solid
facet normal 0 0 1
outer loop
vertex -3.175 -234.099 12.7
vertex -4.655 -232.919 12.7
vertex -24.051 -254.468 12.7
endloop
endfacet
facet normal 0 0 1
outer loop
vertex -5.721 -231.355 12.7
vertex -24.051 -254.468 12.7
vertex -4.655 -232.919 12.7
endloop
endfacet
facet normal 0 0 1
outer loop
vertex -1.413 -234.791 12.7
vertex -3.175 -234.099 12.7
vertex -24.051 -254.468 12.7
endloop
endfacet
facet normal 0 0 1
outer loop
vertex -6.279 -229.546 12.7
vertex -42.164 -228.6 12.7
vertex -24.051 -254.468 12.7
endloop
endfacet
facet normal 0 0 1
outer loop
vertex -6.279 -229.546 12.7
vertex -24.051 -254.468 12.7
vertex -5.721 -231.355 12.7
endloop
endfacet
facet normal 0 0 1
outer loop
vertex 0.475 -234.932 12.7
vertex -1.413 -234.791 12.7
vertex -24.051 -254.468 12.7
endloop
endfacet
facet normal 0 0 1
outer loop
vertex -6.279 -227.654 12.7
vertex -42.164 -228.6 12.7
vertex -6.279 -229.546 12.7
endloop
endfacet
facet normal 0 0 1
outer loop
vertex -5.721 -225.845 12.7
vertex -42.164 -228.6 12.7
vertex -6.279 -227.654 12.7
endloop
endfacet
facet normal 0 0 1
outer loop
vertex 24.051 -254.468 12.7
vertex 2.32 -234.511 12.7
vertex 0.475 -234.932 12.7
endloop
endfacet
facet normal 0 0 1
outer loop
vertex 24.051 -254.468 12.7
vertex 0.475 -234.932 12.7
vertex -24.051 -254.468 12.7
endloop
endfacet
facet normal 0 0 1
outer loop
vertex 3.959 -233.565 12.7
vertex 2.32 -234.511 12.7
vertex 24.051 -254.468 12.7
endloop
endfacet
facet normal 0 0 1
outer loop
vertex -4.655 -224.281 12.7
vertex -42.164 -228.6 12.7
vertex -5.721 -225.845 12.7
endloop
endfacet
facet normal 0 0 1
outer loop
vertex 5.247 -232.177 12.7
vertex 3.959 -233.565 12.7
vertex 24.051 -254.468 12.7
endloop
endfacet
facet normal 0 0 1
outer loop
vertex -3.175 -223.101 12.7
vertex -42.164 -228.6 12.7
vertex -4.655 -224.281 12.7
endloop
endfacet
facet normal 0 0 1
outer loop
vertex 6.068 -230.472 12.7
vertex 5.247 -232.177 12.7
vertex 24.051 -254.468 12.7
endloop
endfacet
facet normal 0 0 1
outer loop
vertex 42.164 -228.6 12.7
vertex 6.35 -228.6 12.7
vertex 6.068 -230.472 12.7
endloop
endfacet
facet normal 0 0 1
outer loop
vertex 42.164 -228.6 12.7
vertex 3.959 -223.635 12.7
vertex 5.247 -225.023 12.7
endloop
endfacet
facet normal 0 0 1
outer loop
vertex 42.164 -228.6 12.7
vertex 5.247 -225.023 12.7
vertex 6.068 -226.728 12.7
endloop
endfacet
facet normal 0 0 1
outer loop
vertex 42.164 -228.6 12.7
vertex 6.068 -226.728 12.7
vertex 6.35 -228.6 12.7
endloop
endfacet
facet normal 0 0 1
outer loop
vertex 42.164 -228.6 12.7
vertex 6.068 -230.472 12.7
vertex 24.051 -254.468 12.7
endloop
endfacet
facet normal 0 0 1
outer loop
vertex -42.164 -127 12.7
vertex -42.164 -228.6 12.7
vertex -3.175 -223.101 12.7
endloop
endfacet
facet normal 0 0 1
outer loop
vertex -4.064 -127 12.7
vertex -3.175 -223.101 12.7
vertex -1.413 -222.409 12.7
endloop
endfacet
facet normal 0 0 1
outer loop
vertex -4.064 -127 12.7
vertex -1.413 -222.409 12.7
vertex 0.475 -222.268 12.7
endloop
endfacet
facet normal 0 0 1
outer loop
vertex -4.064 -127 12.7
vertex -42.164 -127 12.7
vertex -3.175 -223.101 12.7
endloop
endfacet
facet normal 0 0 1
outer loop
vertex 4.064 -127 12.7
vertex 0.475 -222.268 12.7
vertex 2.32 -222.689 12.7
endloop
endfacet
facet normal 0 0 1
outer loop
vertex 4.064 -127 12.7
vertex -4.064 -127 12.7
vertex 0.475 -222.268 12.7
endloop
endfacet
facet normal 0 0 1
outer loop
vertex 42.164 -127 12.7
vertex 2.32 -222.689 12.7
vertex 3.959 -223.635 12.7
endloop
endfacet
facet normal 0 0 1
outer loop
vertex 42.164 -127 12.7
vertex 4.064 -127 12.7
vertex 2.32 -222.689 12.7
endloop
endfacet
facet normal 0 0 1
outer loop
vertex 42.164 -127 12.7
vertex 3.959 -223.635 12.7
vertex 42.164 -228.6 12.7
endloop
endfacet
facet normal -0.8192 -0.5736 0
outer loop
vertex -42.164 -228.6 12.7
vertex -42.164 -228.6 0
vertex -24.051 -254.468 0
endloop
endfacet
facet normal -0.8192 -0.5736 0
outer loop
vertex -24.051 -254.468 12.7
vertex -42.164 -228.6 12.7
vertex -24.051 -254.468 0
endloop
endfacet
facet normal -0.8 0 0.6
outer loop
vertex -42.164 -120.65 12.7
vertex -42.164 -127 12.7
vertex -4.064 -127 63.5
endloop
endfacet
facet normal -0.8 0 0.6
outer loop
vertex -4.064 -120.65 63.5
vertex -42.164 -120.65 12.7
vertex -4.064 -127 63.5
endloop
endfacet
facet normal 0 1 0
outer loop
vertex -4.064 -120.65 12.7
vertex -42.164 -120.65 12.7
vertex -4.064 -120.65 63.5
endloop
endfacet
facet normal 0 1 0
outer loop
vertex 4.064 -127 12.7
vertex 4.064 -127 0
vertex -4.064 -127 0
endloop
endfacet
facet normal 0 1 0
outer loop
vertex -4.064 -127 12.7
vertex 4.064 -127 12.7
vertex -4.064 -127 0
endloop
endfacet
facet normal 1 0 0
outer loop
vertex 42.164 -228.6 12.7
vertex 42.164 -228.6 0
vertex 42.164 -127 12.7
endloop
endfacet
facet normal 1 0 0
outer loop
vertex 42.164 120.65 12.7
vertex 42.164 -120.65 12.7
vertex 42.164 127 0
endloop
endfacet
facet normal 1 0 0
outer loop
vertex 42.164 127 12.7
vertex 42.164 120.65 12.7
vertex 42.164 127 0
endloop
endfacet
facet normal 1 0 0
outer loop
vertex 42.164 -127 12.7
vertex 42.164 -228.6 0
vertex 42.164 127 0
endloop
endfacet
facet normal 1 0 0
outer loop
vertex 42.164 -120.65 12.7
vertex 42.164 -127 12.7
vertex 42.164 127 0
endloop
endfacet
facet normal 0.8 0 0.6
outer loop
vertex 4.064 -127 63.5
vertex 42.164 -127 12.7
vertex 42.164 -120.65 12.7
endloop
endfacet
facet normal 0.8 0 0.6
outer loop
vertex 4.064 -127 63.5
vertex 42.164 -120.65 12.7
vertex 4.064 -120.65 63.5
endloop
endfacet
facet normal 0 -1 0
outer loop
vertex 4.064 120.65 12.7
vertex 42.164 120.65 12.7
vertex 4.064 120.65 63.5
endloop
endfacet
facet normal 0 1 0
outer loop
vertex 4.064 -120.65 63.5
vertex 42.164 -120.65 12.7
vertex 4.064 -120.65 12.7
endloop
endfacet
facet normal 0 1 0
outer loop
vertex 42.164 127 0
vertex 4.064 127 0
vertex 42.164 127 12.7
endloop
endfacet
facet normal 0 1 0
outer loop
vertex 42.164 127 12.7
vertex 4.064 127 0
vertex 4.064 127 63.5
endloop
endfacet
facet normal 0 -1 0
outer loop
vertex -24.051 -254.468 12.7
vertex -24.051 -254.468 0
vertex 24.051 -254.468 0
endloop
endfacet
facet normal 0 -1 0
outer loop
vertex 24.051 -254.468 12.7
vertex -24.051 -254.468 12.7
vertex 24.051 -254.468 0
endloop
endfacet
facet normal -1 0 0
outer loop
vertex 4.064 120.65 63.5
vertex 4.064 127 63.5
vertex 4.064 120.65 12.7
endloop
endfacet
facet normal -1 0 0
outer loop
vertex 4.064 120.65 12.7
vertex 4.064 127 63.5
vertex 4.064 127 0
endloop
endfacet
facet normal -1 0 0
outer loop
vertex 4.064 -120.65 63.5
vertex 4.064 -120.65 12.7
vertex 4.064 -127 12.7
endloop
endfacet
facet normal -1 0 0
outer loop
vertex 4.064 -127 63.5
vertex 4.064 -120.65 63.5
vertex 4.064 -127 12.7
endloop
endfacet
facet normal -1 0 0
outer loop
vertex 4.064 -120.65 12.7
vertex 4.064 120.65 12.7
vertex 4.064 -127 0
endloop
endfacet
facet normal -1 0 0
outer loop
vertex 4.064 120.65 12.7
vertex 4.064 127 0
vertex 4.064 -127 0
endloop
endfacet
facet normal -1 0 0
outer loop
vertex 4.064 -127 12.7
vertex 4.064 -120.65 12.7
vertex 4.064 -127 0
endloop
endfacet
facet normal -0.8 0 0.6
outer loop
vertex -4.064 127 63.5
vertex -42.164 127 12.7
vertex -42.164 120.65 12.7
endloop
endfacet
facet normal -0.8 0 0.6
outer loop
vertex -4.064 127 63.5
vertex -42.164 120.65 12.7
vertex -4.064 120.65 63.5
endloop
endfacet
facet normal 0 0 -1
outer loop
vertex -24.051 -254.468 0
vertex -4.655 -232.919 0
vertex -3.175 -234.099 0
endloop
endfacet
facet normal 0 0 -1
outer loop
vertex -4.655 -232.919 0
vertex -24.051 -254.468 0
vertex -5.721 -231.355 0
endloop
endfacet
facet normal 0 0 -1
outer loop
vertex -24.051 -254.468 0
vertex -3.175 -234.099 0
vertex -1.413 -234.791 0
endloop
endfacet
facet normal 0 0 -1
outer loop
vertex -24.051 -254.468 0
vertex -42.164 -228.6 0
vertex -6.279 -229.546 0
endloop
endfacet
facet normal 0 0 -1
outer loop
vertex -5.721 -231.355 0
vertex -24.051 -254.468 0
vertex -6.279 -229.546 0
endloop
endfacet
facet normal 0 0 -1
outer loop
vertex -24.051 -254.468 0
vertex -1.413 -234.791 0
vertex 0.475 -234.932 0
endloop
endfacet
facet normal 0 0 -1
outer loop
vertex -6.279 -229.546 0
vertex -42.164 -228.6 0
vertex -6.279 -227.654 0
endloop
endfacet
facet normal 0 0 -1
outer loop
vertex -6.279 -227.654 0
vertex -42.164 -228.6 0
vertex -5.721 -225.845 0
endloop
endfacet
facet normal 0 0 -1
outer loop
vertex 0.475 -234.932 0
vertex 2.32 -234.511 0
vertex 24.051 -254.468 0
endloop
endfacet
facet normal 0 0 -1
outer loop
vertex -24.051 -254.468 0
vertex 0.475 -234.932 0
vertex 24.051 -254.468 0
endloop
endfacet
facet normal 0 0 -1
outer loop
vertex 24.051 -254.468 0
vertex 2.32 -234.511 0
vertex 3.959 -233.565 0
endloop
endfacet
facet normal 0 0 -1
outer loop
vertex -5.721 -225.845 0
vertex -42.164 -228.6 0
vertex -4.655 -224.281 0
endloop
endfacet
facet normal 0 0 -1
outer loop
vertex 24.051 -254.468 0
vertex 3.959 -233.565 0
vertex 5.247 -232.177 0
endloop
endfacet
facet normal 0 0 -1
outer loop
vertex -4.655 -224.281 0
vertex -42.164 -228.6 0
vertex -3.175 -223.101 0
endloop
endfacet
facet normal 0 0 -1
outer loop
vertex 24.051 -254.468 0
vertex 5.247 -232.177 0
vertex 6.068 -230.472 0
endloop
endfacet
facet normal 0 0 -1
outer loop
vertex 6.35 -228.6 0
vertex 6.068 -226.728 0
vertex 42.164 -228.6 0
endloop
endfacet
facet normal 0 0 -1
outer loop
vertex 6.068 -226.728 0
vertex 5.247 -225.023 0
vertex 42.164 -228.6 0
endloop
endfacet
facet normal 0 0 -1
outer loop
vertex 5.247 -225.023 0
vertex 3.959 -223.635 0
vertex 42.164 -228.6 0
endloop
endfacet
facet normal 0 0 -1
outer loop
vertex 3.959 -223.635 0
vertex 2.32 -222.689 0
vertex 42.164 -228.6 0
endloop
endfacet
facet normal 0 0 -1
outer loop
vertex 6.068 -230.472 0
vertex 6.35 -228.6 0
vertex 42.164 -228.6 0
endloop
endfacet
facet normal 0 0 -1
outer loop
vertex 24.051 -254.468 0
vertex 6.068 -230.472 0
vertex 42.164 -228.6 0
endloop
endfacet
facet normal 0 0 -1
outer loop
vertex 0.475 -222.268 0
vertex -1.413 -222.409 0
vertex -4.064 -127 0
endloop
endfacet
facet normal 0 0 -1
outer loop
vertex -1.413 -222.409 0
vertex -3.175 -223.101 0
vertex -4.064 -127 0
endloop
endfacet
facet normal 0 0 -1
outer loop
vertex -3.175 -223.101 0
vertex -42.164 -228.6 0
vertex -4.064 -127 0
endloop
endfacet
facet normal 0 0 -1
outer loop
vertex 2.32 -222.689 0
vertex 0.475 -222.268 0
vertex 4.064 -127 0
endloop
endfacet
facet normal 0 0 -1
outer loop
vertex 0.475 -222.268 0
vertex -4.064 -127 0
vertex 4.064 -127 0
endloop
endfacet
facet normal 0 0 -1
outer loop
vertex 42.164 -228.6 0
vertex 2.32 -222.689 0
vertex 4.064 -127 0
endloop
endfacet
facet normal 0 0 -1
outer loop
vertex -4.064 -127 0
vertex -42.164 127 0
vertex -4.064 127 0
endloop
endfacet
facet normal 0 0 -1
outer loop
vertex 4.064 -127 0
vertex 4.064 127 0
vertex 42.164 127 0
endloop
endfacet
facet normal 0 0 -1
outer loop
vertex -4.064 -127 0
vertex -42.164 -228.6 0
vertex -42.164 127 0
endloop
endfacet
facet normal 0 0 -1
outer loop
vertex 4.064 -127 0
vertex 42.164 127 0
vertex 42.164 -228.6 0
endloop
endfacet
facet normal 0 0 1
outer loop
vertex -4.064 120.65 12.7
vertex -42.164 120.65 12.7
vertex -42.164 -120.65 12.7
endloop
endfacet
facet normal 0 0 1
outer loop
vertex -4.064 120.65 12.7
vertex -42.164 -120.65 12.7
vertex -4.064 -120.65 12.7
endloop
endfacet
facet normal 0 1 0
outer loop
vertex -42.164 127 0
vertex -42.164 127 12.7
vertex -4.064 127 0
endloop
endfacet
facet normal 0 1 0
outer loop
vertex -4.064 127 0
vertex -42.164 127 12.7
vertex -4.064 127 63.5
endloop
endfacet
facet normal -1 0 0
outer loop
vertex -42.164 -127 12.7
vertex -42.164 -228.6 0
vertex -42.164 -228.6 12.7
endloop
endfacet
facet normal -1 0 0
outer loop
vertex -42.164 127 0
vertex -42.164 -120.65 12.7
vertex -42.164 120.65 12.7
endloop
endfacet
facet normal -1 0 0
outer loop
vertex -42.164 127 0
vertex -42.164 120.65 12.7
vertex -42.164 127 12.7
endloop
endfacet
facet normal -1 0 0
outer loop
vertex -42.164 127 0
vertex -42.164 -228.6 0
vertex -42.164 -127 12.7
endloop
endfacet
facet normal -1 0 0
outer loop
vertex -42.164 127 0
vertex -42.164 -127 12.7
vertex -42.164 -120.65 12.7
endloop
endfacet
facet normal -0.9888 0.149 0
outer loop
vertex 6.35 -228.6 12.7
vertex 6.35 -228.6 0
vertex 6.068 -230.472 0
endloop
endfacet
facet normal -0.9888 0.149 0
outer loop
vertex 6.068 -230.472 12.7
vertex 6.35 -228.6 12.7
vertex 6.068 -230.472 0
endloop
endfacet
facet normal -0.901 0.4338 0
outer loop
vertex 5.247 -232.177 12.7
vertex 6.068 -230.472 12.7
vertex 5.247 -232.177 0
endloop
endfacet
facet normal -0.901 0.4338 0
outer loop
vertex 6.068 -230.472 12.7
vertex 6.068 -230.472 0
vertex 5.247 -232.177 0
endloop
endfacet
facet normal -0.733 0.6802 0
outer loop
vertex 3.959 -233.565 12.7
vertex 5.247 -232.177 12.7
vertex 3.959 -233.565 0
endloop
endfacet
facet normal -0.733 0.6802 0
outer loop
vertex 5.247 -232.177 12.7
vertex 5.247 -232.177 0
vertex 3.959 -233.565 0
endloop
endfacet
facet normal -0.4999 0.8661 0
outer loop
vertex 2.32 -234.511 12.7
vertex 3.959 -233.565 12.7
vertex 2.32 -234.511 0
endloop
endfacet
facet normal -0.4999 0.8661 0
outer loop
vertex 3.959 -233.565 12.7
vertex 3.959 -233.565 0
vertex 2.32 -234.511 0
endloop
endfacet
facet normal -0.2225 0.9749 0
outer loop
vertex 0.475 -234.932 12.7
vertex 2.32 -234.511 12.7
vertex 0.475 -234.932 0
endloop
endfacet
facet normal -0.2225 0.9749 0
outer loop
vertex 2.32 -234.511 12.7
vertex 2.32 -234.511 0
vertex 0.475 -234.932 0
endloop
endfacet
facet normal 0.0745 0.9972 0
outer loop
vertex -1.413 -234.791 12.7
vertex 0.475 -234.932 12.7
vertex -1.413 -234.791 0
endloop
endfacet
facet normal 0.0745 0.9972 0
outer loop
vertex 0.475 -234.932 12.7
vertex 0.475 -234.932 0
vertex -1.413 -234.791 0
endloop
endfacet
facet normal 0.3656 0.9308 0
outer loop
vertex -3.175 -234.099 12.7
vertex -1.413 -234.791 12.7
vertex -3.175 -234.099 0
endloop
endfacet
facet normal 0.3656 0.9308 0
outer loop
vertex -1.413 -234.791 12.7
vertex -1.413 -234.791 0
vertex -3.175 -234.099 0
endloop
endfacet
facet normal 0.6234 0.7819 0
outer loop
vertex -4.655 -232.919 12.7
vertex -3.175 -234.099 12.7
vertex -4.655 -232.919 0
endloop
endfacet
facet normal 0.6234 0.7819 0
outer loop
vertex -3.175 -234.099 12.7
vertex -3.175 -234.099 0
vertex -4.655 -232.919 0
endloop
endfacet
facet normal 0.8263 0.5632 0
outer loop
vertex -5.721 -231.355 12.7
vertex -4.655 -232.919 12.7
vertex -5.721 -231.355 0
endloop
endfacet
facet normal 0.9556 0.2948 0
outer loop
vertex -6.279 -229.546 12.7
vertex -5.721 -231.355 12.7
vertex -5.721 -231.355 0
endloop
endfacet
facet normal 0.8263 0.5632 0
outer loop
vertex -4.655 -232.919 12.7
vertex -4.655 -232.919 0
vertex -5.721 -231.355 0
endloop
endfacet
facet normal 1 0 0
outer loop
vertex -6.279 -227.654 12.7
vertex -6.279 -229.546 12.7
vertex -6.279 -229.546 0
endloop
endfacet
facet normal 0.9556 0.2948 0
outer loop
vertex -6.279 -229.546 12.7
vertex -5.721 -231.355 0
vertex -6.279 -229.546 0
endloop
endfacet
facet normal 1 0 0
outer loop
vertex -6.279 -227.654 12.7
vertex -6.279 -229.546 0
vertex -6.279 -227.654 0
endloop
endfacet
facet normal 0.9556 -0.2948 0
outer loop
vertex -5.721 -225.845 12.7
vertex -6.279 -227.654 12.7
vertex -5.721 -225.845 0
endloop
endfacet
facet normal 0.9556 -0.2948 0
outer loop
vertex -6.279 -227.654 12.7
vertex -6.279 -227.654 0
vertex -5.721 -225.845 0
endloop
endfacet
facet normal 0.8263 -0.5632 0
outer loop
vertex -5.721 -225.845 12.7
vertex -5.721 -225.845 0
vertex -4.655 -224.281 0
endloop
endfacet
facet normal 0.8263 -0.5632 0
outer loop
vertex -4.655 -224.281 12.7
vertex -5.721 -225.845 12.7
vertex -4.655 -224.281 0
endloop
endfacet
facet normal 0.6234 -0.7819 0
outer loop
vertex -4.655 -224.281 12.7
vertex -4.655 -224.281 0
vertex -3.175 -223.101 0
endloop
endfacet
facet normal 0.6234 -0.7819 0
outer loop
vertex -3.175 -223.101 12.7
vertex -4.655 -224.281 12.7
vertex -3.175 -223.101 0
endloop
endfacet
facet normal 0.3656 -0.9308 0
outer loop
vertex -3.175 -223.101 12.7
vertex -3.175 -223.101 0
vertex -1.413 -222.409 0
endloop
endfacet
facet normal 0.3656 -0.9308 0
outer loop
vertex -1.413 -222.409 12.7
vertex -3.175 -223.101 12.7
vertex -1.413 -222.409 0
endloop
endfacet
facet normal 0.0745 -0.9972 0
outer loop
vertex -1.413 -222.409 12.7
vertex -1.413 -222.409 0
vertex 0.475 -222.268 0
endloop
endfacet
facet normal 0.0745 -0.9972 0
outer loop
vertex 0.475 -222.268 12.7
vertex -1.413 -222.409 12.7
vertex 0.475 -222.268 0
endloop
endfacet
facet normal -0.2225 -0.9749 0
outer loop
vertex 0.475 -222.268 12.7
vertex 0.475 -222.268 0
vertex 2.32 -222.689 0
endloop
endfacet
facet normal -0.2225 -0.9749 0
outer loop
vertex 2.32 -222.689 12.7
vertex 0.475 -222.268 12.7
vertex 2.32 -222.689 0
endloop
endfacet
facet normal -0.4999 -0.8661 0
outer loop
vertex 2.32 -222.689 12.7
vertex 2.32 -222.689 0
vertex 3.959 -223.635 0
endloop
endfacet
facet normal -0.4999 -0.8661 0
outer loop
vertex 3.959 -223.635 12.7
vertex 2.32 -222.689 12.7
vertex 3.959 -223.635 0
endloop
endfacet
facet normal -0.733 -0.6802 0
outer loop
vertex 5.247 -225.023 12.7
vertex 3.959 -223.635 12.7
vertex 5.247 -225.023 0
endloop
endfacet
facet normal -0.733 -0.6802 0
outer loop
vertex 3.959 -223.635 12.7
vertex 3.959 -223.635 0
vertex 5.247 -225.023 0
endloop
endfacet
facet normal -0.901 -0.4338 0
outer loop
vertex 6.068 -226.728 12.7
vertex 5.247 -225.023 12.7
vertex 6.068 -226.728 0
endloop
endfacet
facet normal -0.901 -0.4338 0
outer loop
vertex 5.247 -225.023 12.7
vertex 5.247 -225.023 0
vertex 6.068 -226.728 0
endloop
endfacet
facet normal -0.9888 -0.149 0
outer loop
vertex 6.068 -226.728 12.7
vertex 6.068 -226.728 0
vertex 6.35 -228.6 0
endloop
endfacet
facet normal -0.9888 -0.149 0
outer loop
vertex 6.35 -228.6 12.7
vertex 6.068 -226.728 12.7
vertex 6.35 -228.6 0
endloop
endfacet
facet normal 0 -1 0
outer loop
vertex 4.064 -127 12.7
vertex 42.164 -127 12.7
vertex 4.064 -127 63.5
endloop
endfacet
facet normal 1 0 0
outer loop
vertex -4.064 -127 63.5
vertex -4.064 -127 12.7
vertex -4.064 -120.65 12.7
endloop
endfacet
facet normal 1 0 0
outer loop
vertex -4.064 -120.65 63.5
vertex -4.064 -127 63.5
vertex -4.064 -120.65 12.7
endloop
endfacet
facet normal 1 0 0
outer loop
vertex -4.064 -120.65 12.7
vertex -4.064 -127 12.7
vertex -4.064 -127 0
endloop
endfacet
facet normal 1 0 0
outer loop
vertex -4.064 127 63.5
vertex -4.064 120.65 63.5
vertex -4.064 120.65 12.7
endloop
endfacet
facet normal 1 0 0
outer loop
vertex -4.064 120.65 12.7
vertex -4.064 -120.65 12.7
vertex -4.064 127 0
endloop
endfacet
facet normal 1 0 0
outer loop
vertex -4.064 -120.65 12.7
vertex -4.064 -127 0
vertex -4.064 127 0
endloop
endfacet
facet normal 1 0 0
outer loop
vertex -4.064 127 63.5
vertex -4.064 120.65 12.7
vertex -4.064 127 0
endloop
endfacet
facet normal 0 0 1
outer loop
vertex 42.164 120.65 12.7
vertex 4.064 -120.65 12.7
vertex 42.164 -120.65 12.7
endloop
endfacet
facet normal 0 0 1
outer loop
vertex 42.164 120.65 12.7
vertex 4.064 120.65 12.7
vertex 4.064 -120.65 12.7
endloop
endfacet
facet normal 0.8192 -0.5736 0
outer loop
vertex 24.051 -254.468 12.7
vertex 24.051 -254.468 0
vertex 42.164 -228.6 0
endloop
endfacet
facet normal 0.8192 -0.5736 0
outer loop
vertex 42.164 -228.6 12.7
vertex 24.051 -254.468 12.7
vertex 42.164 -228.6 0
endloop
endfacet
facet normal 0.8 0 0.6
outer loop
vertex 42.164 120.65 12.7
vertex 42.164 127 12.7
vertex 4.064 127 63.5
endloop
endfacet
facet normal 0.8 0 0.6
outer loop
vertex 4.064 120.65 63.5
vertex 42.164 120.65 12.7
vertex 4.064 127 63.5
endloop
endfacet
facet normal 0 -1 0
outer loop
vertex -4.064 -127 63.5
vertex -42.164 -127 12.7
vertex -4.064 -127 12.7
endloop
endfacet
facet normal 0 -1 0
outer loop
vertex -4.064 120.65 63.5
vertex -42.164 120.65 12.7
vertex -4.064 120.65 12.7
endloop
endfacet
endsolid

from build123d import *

# Parameters (mm, degrees)
F1_DEPTH = 12.7
F2_W     = 38.1
F2_H     = 6.35
F3_DEPTH = 50.8
F5_DEPTH = 25.4
F8_W     = 130.532998
F8_H     = 167.270158
F9_DEPTH = 25.4


with BuildPart() as f1:
    # F0 (on Top) → F1 (new body)
    with BuildSketch(Plane.XY):
        with BuildLine():
            Line((4.064, 127), (4.064, -127))
            Line((4.064, -127), (-4.064, -127))
            Line((-4.064, -127), (-4.064, 127))
            Line((-4.064, 127), (-42.164, 127))
            Line((-42.164, 127), (-42.164, -127))
            Line((-42.164, -127), (-42.164, -228.6))
            Line((-42.164, -228.6), (-6.35, -228.6))
            ThreePointArc((-6.35, -228.6), (0, -222.25), (6.35, -228.6))
            Line((6.35, -228.6), (42.164, -228.6))
            Line((42.164, -228.6), (42.164, -127))
            Line((42.164, -127), (42.164, 127))
            Line((42.164, 127), (4.064, 127))
        make_face()
        with BuildLine():
            Line((24.050886, -254.468208), (42.164, -228.6))
            Line((42.164, -228.6), (6.35, -228.6))
            ThreePointArc((6.35, -228.6), (0, -234.95), (-6.35, -228.6))
            Line((-6.35, -228.6), (-42.164, -228.6))
            Line((-42.164, -228.6), (-24.050886, -254.468208))
            Line((-24.050886, -254.468208), (24.050886, -254.468208))
        make_face()
    extrude(amount=F1_DEPTH)

    # F2 (on face) → F3 (join)
    with BuildSketch(Plane.XY.offset(12.7)):
        with Locations((-23.114, -123.825)):
            Rectangle(F2_W, F2_H)
    extrude(amount=F3_DEPTH)

    # F4 (on face) → F5 (cut)
    with BuildSketch(Plane.XZ.offset(127)):
        Polygon((-42.164, 12.7), (-4.064, 63.5), (-42.164, 63.5), align=None)
    extrude(amount=-F5_DEPTH, mode=Mode.SUBTRACT)

    # F6: F1 across plane


with BuildPart() as f1_1:
    add(f1.part)
    add(f1.part.mirror(Plane.YZ))

    # F7: F1 across plane


with BuildPart() as f1_2:
    add(f1_1.part)
    add(f1_1.part.mirror(Plane.XZ))

    # F8 (on face) → F9 (cut)
    with BuildSketch(Plane.XY.offset(12.7)):
        with Locations((23.102499, 210.635079)):
            Rectangle(F8_W, F8_H)
    extrude(amount=-F9_DEPTH, mode=Mode.SUBTRACT)


solid = f1_2.part
